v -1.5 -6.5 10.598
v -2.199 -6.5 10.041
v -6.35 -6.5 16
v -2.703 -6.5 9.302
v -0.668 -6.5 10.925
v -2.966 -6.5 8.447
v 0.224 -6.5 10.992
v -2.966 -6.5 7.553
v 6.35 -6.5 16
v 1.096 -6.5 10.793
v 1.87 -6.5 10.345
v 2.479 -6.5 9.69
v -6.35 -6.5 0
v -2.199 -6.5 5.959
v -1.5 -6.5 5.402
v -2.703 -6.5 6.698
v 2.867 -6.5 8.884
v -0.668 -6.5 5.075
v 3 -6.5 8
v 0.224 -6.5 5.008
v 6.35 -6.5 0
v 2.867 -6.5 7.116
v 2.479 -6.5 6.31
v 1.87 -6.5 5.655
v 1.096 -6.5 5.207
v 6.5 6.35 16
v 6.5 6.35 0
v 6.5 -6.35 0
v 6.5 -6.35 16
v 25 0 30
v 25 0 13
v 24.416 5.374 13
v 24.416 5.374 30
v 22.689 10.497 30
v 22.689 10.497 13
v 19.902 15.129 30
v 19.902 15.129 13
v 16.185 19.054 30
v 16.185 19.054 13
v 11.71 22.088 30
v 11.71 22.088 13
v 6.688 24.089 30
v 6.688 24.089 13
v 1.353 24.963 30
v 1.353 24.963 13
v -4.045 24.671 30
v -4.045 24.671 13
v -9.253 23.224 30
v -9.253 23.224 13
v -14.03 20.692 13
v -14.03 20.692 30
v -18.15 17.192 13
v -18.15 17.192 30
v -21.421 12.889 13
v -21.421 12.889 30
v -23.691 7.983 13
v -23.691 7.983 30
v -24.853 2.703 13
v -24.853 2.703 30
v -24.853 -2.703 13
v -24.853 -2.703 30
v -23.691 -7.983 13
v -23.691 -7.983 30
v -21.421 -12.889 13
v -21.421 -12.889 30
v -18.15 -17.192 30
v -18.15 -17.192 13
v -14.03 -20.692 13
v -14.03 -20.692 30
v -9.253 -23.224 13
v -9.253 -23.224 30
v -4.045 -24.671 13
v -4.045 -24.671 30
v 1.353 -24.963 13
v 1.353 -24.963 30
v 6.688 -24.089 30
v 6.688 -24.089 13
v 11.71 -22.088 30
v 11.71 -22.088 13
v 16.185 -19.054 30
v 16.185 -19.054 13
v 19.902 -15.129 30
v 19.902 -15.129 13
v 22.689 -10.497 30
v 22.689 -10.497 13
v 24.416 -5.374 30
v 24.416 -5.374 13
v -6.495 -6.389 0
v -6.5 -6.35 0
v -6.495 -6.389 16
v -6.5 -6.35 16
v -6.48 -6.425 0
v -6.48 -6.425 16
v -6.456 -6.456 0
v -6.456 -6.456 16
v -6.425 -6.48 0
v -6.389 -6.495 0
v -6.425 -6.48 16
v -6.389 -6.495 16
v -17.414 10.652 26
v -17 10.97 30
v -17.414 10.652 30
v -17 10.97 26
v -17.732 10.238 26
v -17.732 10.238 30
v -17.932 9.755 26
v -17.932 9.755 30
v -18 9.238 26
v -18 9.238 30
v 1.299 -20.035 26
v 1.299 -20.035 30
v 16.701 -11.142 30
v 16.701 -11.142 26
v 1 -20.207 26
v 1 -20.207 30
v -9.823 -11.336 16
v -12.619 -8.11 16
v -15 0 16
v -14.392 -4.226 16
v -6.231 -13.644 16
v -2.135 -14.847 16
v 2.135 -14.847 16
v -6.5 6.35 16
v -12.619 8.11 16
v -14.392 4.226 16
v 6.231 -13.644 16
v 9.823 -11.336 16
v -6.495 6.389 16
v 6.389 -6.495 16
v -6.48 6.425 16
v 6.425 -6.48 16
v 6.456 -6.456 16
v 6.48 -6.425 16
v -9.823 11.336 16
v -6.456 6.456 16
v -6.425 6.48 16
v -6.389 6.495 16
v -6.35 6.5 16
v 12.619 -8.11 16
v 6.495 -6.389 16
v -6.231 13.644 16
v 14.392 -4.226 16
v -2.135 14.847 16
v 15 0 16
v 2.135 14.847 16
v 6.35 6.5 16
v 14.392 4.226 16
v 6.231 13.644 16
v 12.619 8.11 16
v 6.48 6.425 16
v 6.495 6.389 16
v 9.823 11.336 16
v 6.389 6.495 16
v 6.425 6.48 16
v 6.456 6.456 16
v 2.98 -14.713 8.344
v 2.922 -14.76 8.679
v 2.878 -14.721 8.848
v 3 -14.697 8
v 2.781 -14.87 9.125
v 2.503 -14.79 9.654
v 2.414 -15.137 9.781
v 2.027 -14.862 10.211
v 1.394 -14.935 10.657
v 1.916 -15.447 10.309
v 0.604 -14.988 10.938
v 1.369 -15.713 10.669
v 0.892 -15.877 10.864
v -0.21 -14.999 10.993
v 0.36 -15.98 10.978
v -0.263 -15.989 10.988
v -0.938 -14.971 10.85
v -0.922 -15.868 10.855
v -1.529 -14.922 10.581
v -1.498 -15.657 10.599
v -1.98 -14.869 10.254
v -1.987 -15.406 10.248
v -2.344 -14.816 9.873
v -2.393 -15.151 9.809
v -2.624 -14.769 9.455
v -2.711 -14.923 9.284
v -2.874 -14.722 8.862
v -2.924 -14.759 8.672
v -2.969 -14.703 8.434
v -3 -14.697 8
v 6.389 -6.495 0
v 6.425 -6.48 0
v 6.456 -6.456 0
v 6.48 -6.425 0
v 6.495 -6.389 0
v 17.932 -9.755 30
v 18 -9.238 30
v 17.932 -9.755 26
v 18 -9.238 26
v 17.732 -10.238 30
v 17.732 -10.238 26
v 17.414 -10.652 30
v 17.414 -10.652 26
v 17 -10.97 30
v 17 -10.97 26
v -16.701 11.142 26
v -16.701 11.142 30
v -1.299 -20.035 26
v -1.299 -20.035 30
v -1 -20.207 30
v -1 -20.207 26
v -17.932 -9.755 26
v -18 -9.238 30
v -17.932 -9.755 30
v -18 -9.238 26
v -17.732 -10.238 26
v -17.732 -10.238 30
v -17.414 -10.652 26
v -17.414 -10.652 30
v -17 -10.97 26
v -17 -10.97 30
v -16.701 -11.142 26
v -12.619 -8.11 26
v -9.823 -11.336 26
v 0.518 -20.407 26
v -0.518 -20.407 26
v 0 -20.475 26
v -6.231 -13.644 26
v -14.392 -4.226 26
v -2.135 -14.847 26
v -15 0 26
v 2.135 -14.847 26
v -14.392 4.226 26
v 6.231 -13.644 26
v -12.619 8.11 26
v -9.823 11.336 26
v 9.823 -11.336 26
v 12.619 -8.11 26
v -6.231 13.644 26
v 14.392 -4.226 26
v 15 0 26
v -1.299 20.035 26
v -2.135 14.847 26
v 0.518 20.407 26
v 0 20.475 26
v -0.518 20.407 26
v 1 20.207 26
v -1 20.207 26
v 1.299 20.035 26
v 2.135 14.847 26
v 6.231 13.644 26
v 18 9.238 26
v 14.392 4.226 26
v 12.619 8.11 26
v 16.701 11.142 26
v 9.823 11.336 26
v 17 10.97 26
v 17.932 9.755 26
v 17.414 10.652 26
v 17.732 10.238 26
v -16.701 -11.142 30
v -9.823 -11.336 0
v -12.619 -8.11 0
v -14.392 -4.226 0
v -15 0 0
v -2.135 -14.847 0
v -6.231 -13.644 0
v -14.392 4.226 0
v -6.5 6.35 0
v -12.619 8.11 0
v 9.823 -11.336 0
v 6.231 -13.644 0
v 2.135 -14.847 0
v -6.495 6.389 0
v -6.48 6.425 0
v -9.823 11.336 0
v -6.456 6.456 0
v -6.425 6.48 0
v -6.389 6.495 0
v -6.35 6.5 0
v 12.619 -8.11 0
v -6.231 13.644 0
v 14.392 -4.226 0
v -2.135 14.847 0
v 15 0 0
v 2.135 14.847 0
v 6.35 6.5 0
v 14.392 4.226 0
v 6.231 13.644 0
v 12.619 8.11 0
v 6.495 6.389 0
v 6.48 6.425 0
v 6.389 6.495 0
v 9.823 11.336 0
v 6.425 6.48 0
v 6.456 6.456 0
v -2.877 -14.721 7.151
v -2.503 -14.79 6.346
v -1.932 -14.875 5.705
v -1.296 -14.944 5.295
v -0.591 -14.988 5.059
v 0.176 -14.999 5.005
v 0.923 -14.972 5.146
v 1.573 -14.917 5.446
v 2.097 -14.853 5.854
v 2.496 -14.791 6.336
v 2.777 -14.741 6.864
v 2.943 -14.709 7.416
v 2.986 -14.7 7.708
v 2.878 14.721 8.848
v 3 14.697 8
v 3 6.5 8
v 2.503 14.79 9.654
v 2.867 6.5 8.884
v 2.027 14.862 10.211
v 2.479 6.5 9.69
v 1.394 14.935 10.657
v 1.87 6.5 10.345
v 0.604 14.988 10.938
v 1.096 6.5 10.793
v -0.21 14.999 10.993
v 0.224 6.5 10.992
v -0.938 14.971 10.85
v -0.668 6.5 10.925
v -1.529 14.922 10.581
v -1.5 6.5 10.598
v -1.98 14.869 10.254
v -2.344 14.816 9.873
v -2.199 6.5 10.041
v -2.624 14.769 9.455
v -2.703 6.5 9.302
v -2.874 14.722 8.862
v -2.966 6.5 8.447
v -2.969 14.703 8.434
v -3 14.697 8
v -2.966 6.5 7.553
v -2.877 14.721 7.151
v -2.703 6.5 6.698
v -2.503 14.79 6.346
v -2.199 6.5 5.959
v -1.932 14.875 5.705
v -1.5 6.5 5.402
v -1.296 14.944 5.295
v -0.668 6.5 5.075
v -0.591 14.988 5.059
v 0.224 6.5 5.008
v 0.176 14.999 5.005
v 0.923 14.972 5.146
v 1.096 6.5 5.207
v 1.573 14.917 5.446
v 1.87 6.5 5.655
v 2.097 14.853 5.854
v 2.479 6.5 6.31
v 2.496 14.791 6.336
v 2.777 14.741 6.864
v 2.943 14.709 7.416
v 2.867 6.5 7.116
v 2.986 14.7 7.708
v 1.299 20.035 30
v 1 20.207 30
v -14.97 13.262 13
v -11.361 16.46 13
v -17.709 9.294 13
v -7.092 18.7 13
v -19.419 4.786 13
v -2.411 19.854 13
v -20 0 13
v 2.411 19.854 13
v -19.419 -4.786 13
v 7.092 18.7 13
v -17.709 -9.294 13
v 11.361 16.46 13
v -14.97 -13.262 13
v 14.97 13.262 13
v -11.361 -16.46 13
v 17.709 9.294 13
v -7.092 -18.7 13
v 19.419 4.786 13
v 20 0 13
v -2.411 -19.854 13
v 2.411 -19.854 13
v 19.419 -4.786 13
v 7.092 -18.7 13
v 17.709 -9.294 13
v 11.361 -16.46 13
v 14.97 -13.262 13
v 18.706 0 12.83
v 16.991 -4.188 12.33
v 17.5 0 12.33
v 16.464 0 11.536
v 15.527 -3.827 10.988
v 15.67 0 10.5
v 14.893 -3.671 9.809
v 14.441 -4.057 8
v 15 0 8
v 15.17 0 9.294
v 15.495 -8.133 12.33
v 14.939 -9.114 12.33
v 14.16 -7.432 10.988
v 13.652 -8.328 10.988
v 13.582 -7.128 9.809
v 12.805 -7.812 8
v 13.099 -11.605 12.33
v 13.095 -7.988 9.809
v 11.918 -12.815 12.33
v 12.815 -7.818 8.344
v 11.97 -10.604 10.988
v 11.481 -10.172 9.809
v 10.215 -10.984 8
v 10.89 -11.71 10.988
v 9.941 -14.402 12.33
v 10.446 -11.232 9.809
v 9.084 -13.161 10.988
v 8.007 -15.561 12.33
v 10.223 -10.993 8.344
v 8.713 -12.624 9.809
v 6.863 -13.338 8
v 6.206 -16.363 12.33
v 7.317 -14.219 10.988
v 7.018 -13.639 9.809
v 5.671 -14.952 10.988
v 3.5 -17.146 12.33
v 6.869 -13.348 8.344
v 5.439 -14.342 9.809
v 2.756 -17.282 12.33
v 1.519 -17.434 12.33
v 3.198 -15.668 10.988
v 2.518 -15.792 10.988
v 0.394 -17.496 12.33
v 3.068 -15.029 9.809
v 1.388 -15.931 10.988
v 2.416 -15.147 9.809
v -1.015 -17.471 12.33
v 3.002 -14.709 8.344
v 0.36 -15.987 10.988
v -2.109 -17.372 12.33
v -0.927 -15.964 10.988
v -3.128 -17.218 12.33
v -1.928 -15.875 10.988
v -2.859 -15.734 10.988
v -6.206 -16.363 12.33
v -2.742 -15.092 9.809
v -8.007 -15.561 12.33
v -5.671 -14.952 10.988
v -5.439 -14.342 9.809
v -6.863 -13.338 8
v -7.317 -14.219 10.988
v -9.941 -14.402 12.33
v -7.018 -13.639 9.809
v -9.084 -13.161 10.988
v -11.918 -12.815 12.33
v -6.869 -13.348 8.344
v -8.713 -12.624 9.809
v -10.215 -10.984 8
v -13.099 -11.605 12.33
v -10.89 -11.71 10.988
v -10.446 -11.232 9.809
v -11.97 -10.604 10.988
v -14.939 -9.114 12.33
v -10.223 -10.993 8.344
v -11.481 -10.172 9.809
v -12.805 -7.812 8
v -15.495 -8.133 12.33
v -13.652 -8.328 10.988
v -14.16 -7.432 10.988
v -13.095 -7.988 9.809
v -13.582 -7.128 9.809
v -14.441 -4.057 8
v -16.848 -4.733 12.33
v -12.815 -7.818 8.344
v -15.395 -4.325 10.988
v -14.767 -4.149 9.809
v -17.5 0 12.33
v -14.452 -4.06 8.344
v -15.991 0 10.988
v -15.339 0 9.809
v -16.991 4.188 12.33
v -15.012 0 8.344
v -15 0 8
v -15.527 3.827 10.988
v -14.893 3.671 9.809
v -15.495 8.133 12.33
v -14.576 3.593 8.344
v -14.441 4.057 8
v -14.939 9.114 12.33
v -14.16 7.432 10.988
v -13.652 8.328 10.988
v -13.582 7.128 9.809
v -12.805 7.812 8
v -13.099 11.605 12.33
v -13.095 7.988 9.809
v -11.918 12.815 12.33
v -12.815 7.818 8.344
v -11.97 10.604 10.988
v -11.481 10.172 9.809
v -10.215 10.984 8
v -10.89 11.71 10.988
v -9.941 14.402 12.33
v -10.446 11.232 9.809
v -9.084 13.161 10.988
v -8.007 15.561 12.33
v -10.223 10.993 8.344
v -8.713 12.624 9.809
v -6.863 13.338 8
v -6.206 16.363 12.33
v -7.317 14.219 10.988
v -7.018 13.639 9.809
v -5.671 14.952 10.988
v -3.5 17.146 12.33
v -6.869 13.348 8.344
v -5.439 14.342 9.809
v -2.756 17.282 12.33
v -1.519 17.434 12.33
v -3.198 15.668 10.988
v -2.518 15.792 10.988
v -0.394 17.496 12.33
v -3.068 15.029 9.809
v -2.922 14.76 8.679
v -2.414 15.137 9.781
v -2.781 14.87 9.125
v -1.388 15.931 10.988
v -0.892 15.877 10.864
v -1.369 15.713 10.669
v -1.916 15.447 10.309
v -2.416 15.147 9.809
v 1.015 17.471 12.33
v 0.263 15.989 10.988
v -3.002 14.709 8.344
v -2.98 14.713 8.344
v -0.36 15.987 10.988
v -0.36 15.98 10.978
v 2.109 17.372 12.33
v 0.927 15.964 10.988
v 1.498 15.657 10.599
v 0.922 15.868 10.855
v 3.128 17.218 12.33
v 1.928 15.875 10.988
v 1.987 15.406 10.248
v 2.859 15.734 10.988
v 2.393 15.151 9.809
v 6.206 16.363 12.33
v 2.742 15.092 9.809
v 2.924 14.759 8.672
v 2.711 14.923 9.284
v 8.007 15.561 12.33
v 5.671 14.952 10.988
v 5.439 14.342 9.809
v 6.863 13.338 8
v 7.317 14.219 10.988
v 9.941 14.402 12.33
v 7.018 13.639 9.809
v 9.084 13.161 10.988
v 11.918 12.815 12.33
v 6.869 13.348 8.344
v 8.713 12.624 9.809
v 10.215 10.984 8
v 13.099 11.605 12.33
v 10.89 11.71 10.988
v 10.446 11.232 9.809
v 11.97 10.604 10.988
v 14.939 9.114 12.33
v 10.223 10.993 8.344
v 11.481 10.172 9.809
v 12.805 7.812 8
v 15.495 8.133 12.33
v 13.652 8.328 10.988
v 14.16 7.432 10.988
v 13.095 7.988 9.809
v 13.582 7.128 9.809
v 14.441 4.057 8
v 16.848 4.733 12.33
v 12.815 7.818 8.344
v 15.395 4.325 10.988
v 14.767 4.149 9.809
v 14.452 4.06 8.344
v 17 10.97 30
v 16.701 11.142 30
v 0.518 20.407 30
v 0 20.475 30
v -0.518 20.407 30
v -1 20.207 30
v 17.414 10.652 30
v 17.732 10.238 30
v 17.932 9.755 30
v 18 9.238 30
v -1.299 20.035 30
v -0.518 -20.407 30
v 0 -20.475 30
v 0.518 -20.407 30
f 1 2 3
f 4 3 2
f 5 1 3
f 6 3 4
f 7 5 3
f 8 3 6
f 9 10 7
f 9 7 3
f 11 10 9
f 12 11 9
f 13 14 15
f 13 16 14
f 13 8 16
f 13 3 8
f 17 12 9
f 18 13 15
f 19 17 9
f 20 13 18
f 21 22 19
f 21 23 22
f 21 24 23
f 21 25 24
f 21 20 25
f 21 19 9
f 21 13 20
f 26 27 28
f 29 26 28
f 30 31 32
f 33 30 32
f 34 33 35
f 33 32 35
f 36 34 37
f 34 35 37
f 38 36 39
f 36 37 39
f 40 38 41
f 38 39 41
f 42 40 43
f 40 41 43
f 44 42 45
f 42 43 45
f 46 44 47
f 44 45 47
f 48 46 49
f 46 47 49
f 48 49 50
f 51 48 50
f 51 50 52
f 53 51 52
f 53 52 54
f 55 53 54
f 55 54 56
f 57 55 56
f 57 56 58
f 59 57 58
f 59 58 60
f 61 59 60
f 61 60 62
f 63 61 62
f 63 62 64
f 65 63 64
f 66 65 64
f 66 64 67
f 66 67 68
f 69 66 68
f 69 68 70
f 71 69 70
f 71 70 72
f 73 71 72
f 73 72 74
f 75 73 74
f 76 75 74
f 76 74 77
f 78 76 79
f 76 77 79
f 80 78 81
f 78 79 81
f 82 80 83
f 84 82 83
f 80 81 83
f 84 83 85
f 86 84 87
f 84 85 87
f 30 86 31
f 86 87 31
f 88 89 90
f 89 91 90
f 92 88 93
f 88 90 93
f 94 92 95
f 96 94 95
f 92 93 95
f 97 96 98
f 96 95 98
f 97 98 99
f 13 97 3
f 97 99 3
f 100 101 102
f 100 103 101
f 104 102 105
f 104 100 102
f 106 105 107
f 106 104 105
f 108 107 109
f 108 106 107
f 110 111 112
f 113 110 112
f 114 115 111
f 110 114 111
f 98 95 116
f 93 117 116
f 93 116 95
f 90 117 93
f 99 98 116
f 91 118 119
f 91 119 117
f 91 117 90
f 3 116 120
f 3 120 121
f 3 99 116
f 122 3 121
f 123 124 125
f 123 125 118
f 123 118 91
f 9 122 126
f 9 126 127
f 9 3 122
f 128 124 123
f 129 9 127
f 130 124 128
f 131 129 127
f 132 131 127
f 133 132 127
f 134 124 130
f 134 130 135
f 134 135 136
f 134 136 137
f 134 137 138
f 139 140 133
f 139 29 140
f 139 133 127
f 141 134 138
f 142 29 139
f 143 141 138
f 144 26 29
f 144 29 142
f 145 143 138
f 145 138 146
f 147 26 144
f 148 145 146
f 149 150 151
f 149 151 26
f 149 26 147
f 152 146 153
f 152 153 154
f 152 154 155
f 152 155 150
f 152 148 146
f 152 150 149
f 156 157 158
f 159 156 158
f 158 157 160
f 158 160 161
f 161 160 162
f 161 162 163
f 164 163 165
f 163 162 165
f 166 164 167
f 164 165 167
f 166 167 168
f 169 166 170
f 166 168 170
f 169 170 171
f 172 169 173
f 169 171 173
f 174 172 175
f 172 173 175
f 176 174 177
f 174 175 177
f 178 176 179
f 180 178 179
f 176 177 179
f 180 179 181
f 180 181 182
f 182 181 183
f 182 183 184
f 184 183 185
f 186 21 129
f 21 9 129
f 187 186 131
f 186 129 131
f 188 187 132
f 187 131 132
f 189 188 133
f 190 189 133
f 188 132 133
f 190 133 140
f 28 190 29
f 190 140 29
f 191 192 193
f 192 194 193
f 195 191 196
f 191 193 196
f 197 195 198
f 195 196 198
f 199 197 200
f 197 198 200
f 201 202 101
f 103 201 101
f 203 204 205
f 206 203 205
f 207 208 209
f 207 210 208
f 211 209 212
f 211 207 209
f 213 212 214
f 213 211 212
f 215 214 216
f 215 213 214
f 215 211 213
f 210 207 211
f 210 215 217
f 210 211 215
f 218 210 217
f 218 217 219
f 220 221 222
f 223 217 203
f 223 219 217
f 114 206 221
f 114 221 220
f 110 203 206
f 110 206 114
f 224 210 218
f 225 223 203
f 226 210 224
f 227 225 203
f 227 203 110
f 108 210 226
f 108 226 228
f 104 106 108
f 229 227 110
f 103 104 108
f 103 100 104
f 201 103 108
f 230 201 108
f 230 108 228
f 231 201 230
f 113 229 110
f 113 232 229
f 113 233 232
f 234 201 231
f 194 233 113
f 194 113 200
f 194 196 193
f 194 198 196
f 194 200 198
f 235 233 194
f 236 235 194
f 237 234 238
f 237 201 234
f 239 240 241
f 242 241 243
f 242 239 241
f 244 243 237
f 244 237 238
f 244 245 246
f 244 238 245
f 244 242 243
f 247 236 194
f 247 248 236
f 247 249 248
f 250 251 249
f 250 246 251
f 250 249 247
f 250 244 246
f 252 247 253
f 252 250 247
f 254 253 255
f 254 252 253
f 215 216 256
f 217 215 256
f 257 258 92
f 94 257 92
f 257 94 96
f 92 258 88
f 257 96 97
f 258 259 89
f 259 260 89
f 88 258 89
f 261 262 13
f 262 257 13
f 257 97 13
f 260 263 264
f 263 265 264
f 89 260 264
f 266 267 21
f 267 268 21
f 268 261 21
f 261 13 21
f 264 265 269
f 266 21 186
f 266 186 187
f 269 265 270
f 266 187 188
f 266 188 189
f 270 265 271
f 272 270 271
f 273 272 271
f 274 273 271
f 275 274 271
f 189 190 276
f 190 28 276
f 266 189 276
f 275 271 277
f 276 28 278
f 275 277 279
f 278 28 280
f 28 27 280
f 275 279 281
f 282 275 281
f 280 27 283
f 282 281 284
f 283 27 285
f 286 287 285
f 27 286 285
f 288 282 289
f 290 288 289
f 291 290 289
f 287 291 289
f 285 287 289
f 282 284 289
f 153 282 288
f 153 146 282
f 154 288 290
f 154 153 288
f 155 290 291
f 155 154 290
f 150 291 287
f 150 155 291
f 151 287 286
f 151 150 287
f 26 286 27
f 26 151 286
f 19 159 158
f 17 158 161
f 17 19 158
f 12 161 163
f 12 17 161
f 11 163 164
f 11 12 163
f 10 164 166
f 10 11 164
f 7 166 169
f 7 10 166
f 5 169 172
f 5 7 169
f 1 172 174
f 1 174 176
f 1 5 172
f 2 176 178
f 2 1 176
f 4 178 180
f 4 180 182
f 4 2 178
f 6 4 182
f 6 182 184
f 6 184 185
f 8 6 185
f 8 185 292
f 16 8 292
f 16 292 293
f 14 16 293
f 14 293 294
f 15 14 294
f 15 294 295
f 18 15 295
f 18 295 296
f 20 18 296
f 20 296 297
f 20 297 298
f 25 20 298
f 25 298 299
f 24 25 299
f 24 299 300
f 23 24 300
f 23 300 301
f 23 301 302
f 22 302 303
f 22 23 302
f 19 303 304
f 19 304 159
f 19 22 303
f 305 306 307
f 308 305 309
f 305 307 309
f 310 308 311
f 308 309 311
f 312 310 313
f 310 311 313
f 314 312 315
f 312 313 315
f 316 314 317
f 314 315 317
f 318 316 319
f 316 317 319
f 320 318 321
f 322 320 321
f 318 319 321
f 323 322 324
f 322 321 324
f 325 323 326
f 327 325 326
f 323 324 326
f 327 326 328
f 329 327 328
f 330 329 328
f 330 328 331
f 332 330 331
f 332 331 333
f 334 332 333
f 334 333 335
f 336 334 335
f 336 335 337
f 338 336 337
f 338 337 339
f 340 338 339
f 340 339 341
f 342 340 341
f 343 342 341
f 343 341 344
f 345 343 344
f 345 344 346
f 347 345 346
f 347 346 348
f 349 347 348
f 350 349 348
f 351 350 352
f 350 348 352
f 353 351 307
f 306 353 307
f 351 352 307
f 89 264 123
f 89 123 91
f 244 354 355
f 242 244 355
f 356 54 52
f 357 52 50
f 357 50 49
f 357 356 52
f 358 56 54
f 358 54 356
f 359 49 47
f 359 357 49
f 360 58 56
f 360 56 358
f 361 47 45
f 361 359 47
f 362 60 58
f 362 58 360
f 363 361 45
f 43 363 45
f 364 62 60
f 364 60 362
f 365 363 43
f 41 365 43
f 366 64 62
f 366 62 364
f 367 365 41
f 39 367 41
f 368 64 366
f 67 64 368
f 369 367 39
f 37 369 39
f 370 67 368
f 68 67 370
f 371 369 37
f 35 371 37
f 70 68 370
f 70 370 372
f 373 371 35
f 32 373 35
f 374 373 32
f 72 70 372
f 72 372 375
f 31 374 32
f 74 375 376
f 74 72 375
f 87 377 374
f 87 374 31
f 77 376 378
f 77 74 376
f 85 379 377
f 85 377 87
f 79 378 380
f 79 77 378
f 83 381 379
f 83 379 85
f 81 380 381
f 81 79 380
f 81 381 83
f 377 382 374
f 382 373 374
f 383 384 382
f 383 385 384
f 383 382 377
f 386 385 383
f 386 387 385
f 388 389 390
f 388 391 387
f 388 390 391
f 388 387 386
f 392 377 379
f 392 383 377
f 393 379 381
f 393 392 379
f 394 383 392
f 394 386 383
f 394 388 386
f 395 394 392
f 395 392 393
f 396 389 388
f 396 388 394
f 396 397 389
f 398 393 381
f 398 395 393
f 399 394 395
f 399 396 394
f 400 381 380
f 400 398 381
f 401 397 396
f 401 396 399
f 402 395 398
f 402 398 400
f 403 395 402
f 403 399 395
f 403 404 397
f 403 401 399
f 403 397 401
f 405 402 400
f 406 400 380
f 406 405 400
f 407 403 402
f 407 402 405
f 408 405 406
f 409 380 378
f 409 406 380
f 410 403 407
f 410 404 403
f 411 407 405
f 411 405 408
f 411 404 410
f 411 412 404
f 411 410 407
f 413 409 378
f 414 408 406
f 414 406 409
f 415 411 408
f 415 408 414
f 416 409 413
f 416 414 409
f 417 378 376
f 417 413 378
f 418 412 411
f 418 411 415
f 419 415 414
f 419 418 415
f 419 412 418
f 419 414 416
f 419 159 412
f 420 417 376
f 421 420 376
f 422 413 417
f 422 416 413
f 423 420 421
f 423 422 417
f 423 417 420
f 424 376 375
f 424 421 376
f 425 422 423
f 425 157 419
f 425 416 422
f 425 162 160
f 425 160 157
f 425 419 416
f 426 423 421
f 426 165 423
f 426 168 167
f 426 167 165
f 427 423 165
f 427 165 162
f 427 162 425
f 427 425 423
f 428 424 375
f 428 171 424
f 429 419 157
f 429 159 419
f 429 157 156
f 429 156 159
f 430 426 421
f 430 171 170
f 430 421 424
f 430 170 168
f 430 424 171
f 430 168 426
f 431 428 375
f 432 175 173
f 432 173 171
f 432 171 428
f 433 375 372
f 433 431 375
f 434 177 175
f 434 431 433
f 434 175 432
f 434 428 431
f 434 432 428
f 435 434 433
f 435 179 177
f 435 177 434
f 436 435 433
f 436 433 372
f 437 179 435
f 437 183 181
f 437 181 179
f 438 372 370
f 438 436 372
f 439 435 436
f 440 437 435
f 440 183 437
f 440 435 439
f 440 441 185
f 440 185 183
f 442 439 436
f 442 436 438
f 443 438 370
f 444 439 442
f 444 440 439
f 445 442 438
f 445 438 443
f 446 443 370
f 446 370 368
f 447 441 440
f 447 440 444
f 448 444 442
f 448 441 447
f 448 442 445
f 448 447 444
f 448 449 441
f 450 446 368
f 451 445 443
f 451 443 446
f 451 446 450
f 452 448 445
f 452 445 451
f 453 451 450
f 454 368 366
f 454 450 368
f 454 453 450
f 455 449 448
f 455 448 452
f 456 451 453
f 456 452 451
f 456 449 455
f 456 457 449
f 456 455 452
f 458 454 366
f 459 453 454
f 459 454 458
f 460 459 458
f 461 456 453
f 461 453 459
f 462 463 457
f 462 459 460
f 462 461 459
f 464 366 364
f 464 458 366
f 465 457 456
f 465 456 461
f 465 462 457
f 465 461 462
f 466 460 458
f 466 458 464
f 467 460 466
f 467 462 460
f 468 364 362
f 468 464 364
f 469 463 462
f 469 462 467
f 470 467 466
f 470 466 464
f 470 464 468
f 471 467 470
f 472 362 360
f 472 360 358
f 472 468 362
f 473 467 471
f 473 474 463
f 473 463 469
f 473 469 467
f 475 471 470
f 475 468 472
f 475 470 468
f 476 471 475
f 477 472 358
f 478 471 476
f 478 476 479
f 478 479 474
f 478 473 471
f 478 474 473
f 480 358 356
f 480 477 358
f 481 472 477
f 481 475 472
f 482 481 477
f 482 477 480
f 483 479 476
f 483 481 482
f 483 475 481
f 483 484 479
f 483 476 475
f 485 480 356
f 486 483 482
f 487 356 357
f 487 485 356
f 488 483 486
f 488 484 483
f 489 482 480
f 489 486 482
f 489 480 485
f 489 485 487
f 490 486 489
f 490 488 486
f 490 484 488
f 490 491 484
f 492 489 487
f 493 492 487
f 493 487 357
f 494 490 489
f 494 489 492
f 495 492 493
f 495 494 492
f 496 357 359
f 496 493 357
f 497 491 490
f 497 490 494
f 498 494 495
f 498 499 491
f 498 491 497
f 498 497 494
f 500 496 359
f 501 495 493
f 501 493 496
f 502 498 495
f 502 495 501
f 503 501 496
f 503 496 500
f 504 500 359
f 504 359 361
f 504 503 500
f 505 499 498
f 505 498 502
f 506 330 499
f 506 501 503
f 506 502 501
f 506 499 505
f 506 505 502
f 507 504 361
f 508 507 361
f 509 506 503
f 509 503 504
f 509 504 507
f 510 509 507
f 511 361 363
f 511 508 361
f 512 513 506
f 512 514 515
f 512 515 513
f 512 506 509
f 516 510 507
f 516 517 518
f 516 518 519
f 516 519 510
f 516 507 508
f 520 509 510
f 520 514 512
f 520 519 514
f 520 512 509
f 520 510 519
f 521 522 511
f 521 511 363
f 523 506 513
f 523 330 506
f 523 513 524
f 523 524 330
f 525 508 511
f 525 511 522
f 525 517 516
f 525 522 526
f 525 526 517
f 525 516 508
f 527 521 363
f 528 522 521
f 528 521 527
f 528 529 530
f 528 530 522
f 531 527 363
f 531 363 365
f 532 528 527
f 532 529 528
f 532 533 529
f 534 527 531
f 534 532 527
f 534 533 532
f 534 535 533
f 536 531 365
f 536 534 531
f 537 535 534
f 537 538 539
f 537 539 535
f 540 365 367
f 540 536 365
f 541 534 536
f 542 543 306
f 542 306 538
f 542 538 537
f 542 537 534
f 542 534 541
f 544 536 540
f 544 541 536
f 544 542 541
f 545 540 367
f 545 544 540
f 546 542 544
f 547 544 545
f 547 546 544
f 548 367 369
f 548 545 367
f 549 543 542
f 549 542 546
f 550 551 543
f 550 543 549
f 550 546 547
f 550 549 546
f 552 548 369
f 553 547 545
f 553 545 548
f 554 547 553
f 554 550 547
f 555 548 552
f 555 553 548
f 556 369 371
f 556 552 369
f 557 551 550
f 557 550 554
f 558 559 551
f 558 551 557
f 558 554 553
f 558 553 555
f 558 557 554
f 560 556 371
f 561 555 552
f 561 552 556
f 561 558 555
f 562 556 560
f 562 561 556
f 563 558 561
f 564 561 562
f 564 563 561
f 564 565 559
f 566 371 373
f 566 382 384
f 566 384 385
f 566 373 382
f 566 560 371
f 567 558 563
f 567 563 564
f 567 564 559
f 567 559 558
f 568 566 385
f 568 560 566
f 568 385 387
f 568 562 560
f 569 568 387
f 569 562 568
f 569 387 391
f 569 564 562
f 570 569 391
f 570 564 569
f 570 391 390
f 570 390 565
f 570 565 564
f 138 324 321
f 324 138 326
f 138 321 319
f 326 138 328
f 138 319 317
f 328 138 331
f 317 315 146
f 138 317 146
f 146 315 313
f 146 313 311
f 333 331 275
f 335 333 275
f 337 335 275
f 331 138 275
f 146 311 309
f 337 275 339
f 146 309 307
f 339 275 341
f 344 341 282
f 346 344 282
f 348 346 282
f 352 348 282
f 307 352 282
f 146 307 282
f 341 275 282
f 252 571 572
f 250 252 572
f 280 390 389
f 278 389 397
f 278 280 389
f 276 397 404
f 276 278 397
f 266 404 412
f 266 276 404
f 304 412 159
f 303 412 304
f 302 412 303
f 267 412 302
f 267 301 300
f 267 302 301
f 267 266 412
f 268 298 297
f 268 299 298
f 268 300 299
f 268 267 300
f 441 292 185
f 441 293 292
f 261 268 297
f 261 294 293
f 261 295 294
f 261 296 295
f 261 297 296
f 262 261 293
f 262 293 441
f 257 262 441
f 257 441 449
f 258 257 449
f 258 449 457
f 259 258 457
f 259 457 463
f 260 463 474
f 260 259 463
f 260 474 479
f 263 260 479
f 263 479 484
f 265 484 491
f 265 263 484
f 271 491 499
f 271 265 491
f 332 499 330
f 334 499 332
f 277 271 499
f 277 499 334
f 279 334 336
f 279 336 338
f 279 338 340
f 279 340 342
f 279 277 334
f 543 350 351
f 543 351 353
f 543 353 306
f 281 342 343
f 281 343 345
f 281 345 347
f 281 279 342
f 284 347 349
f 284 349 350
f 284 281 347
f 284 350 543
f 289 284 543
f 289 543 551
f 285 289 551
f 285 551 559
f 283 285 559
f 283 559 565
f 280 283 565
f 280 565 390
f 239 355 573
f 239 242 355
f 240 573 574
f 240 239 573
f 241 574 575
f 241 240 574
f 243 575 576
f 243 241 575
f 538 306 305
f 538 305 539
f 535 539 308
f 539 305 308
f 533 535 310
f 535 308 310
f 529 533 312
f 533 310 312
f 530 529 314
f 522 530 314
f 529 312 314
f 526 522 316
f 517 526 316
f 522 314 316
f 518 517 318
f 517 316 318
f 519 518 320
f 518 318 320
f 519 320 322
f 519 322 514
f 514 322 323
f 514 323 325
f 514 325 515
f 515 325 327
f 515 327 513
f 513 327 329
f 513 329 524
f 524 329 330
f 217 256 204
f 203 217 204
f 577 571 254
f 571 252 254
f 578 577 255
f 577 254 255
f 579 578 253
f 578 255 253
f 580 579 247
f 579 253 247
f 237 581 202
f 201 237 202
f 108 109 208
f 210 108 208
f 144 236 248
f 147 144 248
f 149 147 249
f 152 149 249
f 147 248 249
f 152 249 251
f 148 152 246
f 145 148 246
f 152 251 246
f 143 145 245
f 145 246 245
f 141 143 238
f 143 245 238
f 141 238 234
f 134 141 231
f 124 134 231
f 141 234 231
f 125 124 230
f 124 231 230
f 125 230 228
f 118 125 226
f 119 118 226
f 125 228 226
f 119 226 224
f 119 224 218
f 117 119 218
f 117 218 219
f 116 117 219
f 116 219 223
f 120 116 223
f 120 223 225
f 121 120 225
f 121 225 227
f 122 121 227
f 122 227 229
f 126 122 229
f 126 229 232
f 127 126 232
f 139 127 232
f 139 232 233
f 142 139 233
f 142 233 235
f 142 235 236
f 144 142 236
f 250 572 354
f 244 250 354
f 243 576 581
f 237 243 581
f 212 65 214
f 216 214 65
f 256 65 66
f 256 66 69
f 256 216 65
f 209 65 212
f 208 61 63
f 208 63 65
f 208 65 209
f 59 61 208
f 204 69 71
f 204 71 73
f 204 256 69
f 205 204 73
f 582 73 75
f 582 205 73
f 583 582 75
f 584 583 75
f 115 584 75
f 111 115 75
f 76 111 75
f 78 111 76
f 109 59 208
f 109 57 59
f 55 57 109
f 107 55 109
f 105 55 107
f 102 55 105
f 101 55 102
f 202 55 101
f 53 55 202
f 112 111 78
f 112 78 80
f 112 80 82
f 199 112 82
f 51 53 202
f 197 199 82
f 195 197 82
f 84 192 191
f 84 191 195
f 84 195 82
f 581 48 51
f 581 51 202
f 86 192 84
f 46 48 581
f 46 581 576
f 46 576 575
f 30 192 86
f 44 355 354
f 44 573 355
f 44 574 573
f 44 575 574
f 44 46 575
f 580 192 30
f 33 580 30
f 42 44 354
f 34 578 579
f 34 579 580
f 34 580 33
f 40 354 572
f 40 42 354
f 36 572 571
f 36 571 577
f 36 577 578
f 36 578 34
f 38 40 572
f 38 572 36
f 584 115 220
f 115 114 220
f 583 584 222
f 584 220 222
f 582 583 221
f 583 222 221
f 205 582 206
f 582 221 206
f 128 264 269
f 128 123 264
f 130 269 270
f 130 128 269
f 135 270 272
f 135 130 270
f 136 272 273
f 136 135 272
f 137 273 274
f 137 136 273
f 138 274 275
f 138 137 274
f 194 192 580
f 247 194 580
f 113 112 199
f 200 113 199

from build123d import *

# Parameters (mm, degrees)
F0_R           = 25
F1_DEPTH       = 30
F3_DEPTH       = 4
F4_R           = 15
F5_DEPTH       = 14
F6_W           = 13
F6_H           = 13
F7_DEPTH       = 30.001
F8_R           = 25
F8_R_2         = 15
F9_DEPTH       = 13
F10_R          = 3
F11_DEPTH      = 25.001
F11_DEPTH_BACK = 25.001
F12_S5_R       = 3
F12_T6_DEPTH   = 32
F13_R          = 0.15
F14_R          = 2


# Not quite as in the source:
# - a fillet or chamfer that OpenCascade refuses, or shapes differently, is made with other operations: its cross-section is extruded or revolved along the edge and cut away or added


with BuildPart() as f1:
    # F0 (on Top) → F1 (new body)
    with BuildSketch(Plane.XY):
        Circle(F0_R)
    extrude(amount=F1_DEPTH)

    # F2 (on face) → F3 (cut)
    with BuildSketch(Plane.XY.offset(30)):
        with BuildLine():
            Line((16.7009618943, 11.1423048454), (1.2990381057, 20.0346096908))
            ThreePointArc((1.2990381057, 20.0346096908), (0, 19.2846096908), (-1.2990381057, 20.0346096908))
            Line((-1.2990381057, 20.0346096908), (-16.7009618943, 11.1423048454))
            ThreePointArc((-16.7009618943, 11.1423048454), (-16.5511112606, 10.7805334131), (-16.5, 10.3923048454))
            ThreePointArc((-16.5, 10.3923048454), (-16.9393398282, 9.3316446736), (-18, 8.8923048454))
            Line((-18, 8.8923048454), (-18, -8.8923048454))
            ThreePointArc((-18, -8.8923048454), (-16.9393398282, -9.3316446736), (-16.5, -10.3923048454))
            ThreePointArc((-16.5, -10.3923048454), (-16.5511112606, -10.7805334131), (-16.7009618943, -11.1423048454))
            Line((-16.7009618943, -11.1423048454), (-1.2990381057, -20.0346096908))
            ThreePointArc((-1.2990381057, -20.0346096908), (0, -19.2846096908), (1.2990381057, -20.0346096908))
            Line((1.2990381057, -20.0346096908), (16.7009618943, -11.1423048454))
            ThreePointArc((16.7009618943, -11.1423048454), (16.7009618943, -9.6423048454), (18, -8.8923048454))
            Line((18, -8.8923048454), (18, 8.8923048454))
            ThreePointArc((18, 8.8923048454), (16.7009618943, 9.6423048454), (16.7009618943, 11.1423048454))
        make_face()
        with BuildLine():
            ThreePointArc((-16.5, 10.3923048454), (-16.5511112606, 10.7805334131), (-16.7009618943, 11.1423048454))
            Line((-16.7009618943, 11.1423048454), (-18, 10.3923048454))
            Line((-18, 10.3923048454), (-18, 8.8923048454))
            ThreePointArc((-18, 8.8923048454), (-16.9393398282, 9.3316446736), (-16.5, 10.3923048454))
        make_face()
        with BuildLine():
            ThreePointArc((-16.5, -10.3923048454), (-16.9393398282, -9.3316446736), (-18, -8.8923048454))
            Line((-18, -8.8923048454), (-18, -10.3923048454))
            Line((-18, -10.3923048454), (-16.7009618943, -11.1423048454))
            ThreePointArc((-16.7009618943, -11.1423048454), (-16.5511112606, -10.7805334131), (-16.5, -10.3923048454))
        make_face()
        with BuildLine():
            Line((0, -20.7846096908), (1.2990381057, -20.0346096908))
            ThreePointArc((1.2990381057, -20.0346096908), (0, -19.2846096908), (-1.2990381057, -20.0346096908))
            Line((-1.2990381057, -20.0346096908), (0, -20.7846096908))
        make_face()
        with BuildLine():
            Line((18, -10.3923048454), (18, -8.8923048454))
            ThreePointArc((18, -8.8923048454), (16.7009618943, -9.6423048454), (16.7009618943, -11.1423048454))
            Line((16.7009618943, -11.1423048454), (18, -10.3923048454))
        make_face()
        with BuildLine():
            Line((18, 10.3923048454), (16.7009618943, 11.1423048454))
            ThreePointArc((16.7009618943, 11.1423048454), (16.7009618943, 9.6423048454), (18, 8.8923048454))
            Line((18, 8.8923048454), (18, 10.3923048454))
        make_face()
        with BuildLine():
            Line((1.2990381057, 20.0346096908), (0, 20.7846096908))
            Line((0, 20.7846096908), (-1.2990381057, 20.0346096908))
            ThreePointArc((-1.2990381057, 20.0346096908), (0, 19.2846096908), (1.2990381057, 20.0346096908))
        make_face()
    extrude(amount=-F3_DEPTH, mode=Mode.SUBTRACT)

    # F4 (on face) → F5 (cut)
    with BuildSketch(Plane.XY.offset(30)):
        Circle(F4_R)
    extrude(amount=-F5_DEPTH, mode=Mode.SUBTRACT)

    # F6 (on face) → F7 (cut, through all)
    with BuildSketch(Plane(origin=(0, 0, 0), x_dir=(1, 0, 0), z_dir=(0, 0, -1))):
        Rectangle(F6_W, F6_H)
    extrude(amount=-F7_DEPTH, mode=Mode.SUBTRACT)

    # F8 (on face) → F9 (cut)
    with BuildSketch(Plane(origin=(0, 0, 0), x_dir=(1, 0, 0), z_dir=(0, 0, -1))):
        Circle(F8_R)
        Circle(F8_R_2, mode=Mode.SUBTRACT)
    extrude(amount=-F9_DEPTH, mode=Mode.SUBTRACT)

    # F10 (on Front) → F11 (cut, two sides)
    with BuildSketch(Plane.XZ) as f11_sk:
        with Locations((0, 8)):
            Circle(F10_R)
    extrude(amount=-F11_DEPTH, mode=Mode.SUBTRACT)
    extrude(f11_sk.sketch, amount=F11_DEPTH_BACK, mode=Mode.SUBTRACT)

    # F12: fillet of radius 5 on 1 edges, made by hand


with BuildPart() as f12_tool2:
    # F12_s3 → F12_t4 (revolve)
    with BuildSketch(Plane.XZ):
        with BuildLine():
            ThreePointArc((20, 13), (16.4644660941, 11.5355339059), (15, 8))
            Line((15, 8), (15, 13))
            Line((15, 13), (20, 13))
        make_face()
    revolve(axis=Axis((0, 0, 13), (0, 0, -1)))

    # F12_s5 → F12_t6 (cut, symmetric)
    with BuildSketch(Plane.XZ):
        with Locations((0, 8)):
            Circle(F12_S5_R)
    extrude(amount=F12_T6_DEPTH, both=True, mode=Mode.SUBTRACT)


with BuildPart() as f1_1:
    add(f1.part)

    # F12_t1: union F12_tool2
    add(f12_tool2.part)

    # F13
    f13_edges = [f1_1.edges().sort_by_distance(p)[0] for p in [
        (-6.5, -6.5, 8),
        (-6.5, 6.5, 8),
        (6.5, 6.5, 8),
        (6.5, -6.5, 8),
    ]]
    fillet(f13_edges, radius=F13_R)

    # F14
    f14_edges = [f1_1.edges().sort_by_distance(p)[0] for p in [
        (-18, -10.392305, 28),
        (-18, 10.392305, 28),
        (0, -20.78461, 28),
        (18, -10.392305, 28),
        (18, 10.392305, 28),
        (0, 20.78461, 28),
    ]]
    fillet(f14_edges, radius=F14_R)


solid = f1_1.part
